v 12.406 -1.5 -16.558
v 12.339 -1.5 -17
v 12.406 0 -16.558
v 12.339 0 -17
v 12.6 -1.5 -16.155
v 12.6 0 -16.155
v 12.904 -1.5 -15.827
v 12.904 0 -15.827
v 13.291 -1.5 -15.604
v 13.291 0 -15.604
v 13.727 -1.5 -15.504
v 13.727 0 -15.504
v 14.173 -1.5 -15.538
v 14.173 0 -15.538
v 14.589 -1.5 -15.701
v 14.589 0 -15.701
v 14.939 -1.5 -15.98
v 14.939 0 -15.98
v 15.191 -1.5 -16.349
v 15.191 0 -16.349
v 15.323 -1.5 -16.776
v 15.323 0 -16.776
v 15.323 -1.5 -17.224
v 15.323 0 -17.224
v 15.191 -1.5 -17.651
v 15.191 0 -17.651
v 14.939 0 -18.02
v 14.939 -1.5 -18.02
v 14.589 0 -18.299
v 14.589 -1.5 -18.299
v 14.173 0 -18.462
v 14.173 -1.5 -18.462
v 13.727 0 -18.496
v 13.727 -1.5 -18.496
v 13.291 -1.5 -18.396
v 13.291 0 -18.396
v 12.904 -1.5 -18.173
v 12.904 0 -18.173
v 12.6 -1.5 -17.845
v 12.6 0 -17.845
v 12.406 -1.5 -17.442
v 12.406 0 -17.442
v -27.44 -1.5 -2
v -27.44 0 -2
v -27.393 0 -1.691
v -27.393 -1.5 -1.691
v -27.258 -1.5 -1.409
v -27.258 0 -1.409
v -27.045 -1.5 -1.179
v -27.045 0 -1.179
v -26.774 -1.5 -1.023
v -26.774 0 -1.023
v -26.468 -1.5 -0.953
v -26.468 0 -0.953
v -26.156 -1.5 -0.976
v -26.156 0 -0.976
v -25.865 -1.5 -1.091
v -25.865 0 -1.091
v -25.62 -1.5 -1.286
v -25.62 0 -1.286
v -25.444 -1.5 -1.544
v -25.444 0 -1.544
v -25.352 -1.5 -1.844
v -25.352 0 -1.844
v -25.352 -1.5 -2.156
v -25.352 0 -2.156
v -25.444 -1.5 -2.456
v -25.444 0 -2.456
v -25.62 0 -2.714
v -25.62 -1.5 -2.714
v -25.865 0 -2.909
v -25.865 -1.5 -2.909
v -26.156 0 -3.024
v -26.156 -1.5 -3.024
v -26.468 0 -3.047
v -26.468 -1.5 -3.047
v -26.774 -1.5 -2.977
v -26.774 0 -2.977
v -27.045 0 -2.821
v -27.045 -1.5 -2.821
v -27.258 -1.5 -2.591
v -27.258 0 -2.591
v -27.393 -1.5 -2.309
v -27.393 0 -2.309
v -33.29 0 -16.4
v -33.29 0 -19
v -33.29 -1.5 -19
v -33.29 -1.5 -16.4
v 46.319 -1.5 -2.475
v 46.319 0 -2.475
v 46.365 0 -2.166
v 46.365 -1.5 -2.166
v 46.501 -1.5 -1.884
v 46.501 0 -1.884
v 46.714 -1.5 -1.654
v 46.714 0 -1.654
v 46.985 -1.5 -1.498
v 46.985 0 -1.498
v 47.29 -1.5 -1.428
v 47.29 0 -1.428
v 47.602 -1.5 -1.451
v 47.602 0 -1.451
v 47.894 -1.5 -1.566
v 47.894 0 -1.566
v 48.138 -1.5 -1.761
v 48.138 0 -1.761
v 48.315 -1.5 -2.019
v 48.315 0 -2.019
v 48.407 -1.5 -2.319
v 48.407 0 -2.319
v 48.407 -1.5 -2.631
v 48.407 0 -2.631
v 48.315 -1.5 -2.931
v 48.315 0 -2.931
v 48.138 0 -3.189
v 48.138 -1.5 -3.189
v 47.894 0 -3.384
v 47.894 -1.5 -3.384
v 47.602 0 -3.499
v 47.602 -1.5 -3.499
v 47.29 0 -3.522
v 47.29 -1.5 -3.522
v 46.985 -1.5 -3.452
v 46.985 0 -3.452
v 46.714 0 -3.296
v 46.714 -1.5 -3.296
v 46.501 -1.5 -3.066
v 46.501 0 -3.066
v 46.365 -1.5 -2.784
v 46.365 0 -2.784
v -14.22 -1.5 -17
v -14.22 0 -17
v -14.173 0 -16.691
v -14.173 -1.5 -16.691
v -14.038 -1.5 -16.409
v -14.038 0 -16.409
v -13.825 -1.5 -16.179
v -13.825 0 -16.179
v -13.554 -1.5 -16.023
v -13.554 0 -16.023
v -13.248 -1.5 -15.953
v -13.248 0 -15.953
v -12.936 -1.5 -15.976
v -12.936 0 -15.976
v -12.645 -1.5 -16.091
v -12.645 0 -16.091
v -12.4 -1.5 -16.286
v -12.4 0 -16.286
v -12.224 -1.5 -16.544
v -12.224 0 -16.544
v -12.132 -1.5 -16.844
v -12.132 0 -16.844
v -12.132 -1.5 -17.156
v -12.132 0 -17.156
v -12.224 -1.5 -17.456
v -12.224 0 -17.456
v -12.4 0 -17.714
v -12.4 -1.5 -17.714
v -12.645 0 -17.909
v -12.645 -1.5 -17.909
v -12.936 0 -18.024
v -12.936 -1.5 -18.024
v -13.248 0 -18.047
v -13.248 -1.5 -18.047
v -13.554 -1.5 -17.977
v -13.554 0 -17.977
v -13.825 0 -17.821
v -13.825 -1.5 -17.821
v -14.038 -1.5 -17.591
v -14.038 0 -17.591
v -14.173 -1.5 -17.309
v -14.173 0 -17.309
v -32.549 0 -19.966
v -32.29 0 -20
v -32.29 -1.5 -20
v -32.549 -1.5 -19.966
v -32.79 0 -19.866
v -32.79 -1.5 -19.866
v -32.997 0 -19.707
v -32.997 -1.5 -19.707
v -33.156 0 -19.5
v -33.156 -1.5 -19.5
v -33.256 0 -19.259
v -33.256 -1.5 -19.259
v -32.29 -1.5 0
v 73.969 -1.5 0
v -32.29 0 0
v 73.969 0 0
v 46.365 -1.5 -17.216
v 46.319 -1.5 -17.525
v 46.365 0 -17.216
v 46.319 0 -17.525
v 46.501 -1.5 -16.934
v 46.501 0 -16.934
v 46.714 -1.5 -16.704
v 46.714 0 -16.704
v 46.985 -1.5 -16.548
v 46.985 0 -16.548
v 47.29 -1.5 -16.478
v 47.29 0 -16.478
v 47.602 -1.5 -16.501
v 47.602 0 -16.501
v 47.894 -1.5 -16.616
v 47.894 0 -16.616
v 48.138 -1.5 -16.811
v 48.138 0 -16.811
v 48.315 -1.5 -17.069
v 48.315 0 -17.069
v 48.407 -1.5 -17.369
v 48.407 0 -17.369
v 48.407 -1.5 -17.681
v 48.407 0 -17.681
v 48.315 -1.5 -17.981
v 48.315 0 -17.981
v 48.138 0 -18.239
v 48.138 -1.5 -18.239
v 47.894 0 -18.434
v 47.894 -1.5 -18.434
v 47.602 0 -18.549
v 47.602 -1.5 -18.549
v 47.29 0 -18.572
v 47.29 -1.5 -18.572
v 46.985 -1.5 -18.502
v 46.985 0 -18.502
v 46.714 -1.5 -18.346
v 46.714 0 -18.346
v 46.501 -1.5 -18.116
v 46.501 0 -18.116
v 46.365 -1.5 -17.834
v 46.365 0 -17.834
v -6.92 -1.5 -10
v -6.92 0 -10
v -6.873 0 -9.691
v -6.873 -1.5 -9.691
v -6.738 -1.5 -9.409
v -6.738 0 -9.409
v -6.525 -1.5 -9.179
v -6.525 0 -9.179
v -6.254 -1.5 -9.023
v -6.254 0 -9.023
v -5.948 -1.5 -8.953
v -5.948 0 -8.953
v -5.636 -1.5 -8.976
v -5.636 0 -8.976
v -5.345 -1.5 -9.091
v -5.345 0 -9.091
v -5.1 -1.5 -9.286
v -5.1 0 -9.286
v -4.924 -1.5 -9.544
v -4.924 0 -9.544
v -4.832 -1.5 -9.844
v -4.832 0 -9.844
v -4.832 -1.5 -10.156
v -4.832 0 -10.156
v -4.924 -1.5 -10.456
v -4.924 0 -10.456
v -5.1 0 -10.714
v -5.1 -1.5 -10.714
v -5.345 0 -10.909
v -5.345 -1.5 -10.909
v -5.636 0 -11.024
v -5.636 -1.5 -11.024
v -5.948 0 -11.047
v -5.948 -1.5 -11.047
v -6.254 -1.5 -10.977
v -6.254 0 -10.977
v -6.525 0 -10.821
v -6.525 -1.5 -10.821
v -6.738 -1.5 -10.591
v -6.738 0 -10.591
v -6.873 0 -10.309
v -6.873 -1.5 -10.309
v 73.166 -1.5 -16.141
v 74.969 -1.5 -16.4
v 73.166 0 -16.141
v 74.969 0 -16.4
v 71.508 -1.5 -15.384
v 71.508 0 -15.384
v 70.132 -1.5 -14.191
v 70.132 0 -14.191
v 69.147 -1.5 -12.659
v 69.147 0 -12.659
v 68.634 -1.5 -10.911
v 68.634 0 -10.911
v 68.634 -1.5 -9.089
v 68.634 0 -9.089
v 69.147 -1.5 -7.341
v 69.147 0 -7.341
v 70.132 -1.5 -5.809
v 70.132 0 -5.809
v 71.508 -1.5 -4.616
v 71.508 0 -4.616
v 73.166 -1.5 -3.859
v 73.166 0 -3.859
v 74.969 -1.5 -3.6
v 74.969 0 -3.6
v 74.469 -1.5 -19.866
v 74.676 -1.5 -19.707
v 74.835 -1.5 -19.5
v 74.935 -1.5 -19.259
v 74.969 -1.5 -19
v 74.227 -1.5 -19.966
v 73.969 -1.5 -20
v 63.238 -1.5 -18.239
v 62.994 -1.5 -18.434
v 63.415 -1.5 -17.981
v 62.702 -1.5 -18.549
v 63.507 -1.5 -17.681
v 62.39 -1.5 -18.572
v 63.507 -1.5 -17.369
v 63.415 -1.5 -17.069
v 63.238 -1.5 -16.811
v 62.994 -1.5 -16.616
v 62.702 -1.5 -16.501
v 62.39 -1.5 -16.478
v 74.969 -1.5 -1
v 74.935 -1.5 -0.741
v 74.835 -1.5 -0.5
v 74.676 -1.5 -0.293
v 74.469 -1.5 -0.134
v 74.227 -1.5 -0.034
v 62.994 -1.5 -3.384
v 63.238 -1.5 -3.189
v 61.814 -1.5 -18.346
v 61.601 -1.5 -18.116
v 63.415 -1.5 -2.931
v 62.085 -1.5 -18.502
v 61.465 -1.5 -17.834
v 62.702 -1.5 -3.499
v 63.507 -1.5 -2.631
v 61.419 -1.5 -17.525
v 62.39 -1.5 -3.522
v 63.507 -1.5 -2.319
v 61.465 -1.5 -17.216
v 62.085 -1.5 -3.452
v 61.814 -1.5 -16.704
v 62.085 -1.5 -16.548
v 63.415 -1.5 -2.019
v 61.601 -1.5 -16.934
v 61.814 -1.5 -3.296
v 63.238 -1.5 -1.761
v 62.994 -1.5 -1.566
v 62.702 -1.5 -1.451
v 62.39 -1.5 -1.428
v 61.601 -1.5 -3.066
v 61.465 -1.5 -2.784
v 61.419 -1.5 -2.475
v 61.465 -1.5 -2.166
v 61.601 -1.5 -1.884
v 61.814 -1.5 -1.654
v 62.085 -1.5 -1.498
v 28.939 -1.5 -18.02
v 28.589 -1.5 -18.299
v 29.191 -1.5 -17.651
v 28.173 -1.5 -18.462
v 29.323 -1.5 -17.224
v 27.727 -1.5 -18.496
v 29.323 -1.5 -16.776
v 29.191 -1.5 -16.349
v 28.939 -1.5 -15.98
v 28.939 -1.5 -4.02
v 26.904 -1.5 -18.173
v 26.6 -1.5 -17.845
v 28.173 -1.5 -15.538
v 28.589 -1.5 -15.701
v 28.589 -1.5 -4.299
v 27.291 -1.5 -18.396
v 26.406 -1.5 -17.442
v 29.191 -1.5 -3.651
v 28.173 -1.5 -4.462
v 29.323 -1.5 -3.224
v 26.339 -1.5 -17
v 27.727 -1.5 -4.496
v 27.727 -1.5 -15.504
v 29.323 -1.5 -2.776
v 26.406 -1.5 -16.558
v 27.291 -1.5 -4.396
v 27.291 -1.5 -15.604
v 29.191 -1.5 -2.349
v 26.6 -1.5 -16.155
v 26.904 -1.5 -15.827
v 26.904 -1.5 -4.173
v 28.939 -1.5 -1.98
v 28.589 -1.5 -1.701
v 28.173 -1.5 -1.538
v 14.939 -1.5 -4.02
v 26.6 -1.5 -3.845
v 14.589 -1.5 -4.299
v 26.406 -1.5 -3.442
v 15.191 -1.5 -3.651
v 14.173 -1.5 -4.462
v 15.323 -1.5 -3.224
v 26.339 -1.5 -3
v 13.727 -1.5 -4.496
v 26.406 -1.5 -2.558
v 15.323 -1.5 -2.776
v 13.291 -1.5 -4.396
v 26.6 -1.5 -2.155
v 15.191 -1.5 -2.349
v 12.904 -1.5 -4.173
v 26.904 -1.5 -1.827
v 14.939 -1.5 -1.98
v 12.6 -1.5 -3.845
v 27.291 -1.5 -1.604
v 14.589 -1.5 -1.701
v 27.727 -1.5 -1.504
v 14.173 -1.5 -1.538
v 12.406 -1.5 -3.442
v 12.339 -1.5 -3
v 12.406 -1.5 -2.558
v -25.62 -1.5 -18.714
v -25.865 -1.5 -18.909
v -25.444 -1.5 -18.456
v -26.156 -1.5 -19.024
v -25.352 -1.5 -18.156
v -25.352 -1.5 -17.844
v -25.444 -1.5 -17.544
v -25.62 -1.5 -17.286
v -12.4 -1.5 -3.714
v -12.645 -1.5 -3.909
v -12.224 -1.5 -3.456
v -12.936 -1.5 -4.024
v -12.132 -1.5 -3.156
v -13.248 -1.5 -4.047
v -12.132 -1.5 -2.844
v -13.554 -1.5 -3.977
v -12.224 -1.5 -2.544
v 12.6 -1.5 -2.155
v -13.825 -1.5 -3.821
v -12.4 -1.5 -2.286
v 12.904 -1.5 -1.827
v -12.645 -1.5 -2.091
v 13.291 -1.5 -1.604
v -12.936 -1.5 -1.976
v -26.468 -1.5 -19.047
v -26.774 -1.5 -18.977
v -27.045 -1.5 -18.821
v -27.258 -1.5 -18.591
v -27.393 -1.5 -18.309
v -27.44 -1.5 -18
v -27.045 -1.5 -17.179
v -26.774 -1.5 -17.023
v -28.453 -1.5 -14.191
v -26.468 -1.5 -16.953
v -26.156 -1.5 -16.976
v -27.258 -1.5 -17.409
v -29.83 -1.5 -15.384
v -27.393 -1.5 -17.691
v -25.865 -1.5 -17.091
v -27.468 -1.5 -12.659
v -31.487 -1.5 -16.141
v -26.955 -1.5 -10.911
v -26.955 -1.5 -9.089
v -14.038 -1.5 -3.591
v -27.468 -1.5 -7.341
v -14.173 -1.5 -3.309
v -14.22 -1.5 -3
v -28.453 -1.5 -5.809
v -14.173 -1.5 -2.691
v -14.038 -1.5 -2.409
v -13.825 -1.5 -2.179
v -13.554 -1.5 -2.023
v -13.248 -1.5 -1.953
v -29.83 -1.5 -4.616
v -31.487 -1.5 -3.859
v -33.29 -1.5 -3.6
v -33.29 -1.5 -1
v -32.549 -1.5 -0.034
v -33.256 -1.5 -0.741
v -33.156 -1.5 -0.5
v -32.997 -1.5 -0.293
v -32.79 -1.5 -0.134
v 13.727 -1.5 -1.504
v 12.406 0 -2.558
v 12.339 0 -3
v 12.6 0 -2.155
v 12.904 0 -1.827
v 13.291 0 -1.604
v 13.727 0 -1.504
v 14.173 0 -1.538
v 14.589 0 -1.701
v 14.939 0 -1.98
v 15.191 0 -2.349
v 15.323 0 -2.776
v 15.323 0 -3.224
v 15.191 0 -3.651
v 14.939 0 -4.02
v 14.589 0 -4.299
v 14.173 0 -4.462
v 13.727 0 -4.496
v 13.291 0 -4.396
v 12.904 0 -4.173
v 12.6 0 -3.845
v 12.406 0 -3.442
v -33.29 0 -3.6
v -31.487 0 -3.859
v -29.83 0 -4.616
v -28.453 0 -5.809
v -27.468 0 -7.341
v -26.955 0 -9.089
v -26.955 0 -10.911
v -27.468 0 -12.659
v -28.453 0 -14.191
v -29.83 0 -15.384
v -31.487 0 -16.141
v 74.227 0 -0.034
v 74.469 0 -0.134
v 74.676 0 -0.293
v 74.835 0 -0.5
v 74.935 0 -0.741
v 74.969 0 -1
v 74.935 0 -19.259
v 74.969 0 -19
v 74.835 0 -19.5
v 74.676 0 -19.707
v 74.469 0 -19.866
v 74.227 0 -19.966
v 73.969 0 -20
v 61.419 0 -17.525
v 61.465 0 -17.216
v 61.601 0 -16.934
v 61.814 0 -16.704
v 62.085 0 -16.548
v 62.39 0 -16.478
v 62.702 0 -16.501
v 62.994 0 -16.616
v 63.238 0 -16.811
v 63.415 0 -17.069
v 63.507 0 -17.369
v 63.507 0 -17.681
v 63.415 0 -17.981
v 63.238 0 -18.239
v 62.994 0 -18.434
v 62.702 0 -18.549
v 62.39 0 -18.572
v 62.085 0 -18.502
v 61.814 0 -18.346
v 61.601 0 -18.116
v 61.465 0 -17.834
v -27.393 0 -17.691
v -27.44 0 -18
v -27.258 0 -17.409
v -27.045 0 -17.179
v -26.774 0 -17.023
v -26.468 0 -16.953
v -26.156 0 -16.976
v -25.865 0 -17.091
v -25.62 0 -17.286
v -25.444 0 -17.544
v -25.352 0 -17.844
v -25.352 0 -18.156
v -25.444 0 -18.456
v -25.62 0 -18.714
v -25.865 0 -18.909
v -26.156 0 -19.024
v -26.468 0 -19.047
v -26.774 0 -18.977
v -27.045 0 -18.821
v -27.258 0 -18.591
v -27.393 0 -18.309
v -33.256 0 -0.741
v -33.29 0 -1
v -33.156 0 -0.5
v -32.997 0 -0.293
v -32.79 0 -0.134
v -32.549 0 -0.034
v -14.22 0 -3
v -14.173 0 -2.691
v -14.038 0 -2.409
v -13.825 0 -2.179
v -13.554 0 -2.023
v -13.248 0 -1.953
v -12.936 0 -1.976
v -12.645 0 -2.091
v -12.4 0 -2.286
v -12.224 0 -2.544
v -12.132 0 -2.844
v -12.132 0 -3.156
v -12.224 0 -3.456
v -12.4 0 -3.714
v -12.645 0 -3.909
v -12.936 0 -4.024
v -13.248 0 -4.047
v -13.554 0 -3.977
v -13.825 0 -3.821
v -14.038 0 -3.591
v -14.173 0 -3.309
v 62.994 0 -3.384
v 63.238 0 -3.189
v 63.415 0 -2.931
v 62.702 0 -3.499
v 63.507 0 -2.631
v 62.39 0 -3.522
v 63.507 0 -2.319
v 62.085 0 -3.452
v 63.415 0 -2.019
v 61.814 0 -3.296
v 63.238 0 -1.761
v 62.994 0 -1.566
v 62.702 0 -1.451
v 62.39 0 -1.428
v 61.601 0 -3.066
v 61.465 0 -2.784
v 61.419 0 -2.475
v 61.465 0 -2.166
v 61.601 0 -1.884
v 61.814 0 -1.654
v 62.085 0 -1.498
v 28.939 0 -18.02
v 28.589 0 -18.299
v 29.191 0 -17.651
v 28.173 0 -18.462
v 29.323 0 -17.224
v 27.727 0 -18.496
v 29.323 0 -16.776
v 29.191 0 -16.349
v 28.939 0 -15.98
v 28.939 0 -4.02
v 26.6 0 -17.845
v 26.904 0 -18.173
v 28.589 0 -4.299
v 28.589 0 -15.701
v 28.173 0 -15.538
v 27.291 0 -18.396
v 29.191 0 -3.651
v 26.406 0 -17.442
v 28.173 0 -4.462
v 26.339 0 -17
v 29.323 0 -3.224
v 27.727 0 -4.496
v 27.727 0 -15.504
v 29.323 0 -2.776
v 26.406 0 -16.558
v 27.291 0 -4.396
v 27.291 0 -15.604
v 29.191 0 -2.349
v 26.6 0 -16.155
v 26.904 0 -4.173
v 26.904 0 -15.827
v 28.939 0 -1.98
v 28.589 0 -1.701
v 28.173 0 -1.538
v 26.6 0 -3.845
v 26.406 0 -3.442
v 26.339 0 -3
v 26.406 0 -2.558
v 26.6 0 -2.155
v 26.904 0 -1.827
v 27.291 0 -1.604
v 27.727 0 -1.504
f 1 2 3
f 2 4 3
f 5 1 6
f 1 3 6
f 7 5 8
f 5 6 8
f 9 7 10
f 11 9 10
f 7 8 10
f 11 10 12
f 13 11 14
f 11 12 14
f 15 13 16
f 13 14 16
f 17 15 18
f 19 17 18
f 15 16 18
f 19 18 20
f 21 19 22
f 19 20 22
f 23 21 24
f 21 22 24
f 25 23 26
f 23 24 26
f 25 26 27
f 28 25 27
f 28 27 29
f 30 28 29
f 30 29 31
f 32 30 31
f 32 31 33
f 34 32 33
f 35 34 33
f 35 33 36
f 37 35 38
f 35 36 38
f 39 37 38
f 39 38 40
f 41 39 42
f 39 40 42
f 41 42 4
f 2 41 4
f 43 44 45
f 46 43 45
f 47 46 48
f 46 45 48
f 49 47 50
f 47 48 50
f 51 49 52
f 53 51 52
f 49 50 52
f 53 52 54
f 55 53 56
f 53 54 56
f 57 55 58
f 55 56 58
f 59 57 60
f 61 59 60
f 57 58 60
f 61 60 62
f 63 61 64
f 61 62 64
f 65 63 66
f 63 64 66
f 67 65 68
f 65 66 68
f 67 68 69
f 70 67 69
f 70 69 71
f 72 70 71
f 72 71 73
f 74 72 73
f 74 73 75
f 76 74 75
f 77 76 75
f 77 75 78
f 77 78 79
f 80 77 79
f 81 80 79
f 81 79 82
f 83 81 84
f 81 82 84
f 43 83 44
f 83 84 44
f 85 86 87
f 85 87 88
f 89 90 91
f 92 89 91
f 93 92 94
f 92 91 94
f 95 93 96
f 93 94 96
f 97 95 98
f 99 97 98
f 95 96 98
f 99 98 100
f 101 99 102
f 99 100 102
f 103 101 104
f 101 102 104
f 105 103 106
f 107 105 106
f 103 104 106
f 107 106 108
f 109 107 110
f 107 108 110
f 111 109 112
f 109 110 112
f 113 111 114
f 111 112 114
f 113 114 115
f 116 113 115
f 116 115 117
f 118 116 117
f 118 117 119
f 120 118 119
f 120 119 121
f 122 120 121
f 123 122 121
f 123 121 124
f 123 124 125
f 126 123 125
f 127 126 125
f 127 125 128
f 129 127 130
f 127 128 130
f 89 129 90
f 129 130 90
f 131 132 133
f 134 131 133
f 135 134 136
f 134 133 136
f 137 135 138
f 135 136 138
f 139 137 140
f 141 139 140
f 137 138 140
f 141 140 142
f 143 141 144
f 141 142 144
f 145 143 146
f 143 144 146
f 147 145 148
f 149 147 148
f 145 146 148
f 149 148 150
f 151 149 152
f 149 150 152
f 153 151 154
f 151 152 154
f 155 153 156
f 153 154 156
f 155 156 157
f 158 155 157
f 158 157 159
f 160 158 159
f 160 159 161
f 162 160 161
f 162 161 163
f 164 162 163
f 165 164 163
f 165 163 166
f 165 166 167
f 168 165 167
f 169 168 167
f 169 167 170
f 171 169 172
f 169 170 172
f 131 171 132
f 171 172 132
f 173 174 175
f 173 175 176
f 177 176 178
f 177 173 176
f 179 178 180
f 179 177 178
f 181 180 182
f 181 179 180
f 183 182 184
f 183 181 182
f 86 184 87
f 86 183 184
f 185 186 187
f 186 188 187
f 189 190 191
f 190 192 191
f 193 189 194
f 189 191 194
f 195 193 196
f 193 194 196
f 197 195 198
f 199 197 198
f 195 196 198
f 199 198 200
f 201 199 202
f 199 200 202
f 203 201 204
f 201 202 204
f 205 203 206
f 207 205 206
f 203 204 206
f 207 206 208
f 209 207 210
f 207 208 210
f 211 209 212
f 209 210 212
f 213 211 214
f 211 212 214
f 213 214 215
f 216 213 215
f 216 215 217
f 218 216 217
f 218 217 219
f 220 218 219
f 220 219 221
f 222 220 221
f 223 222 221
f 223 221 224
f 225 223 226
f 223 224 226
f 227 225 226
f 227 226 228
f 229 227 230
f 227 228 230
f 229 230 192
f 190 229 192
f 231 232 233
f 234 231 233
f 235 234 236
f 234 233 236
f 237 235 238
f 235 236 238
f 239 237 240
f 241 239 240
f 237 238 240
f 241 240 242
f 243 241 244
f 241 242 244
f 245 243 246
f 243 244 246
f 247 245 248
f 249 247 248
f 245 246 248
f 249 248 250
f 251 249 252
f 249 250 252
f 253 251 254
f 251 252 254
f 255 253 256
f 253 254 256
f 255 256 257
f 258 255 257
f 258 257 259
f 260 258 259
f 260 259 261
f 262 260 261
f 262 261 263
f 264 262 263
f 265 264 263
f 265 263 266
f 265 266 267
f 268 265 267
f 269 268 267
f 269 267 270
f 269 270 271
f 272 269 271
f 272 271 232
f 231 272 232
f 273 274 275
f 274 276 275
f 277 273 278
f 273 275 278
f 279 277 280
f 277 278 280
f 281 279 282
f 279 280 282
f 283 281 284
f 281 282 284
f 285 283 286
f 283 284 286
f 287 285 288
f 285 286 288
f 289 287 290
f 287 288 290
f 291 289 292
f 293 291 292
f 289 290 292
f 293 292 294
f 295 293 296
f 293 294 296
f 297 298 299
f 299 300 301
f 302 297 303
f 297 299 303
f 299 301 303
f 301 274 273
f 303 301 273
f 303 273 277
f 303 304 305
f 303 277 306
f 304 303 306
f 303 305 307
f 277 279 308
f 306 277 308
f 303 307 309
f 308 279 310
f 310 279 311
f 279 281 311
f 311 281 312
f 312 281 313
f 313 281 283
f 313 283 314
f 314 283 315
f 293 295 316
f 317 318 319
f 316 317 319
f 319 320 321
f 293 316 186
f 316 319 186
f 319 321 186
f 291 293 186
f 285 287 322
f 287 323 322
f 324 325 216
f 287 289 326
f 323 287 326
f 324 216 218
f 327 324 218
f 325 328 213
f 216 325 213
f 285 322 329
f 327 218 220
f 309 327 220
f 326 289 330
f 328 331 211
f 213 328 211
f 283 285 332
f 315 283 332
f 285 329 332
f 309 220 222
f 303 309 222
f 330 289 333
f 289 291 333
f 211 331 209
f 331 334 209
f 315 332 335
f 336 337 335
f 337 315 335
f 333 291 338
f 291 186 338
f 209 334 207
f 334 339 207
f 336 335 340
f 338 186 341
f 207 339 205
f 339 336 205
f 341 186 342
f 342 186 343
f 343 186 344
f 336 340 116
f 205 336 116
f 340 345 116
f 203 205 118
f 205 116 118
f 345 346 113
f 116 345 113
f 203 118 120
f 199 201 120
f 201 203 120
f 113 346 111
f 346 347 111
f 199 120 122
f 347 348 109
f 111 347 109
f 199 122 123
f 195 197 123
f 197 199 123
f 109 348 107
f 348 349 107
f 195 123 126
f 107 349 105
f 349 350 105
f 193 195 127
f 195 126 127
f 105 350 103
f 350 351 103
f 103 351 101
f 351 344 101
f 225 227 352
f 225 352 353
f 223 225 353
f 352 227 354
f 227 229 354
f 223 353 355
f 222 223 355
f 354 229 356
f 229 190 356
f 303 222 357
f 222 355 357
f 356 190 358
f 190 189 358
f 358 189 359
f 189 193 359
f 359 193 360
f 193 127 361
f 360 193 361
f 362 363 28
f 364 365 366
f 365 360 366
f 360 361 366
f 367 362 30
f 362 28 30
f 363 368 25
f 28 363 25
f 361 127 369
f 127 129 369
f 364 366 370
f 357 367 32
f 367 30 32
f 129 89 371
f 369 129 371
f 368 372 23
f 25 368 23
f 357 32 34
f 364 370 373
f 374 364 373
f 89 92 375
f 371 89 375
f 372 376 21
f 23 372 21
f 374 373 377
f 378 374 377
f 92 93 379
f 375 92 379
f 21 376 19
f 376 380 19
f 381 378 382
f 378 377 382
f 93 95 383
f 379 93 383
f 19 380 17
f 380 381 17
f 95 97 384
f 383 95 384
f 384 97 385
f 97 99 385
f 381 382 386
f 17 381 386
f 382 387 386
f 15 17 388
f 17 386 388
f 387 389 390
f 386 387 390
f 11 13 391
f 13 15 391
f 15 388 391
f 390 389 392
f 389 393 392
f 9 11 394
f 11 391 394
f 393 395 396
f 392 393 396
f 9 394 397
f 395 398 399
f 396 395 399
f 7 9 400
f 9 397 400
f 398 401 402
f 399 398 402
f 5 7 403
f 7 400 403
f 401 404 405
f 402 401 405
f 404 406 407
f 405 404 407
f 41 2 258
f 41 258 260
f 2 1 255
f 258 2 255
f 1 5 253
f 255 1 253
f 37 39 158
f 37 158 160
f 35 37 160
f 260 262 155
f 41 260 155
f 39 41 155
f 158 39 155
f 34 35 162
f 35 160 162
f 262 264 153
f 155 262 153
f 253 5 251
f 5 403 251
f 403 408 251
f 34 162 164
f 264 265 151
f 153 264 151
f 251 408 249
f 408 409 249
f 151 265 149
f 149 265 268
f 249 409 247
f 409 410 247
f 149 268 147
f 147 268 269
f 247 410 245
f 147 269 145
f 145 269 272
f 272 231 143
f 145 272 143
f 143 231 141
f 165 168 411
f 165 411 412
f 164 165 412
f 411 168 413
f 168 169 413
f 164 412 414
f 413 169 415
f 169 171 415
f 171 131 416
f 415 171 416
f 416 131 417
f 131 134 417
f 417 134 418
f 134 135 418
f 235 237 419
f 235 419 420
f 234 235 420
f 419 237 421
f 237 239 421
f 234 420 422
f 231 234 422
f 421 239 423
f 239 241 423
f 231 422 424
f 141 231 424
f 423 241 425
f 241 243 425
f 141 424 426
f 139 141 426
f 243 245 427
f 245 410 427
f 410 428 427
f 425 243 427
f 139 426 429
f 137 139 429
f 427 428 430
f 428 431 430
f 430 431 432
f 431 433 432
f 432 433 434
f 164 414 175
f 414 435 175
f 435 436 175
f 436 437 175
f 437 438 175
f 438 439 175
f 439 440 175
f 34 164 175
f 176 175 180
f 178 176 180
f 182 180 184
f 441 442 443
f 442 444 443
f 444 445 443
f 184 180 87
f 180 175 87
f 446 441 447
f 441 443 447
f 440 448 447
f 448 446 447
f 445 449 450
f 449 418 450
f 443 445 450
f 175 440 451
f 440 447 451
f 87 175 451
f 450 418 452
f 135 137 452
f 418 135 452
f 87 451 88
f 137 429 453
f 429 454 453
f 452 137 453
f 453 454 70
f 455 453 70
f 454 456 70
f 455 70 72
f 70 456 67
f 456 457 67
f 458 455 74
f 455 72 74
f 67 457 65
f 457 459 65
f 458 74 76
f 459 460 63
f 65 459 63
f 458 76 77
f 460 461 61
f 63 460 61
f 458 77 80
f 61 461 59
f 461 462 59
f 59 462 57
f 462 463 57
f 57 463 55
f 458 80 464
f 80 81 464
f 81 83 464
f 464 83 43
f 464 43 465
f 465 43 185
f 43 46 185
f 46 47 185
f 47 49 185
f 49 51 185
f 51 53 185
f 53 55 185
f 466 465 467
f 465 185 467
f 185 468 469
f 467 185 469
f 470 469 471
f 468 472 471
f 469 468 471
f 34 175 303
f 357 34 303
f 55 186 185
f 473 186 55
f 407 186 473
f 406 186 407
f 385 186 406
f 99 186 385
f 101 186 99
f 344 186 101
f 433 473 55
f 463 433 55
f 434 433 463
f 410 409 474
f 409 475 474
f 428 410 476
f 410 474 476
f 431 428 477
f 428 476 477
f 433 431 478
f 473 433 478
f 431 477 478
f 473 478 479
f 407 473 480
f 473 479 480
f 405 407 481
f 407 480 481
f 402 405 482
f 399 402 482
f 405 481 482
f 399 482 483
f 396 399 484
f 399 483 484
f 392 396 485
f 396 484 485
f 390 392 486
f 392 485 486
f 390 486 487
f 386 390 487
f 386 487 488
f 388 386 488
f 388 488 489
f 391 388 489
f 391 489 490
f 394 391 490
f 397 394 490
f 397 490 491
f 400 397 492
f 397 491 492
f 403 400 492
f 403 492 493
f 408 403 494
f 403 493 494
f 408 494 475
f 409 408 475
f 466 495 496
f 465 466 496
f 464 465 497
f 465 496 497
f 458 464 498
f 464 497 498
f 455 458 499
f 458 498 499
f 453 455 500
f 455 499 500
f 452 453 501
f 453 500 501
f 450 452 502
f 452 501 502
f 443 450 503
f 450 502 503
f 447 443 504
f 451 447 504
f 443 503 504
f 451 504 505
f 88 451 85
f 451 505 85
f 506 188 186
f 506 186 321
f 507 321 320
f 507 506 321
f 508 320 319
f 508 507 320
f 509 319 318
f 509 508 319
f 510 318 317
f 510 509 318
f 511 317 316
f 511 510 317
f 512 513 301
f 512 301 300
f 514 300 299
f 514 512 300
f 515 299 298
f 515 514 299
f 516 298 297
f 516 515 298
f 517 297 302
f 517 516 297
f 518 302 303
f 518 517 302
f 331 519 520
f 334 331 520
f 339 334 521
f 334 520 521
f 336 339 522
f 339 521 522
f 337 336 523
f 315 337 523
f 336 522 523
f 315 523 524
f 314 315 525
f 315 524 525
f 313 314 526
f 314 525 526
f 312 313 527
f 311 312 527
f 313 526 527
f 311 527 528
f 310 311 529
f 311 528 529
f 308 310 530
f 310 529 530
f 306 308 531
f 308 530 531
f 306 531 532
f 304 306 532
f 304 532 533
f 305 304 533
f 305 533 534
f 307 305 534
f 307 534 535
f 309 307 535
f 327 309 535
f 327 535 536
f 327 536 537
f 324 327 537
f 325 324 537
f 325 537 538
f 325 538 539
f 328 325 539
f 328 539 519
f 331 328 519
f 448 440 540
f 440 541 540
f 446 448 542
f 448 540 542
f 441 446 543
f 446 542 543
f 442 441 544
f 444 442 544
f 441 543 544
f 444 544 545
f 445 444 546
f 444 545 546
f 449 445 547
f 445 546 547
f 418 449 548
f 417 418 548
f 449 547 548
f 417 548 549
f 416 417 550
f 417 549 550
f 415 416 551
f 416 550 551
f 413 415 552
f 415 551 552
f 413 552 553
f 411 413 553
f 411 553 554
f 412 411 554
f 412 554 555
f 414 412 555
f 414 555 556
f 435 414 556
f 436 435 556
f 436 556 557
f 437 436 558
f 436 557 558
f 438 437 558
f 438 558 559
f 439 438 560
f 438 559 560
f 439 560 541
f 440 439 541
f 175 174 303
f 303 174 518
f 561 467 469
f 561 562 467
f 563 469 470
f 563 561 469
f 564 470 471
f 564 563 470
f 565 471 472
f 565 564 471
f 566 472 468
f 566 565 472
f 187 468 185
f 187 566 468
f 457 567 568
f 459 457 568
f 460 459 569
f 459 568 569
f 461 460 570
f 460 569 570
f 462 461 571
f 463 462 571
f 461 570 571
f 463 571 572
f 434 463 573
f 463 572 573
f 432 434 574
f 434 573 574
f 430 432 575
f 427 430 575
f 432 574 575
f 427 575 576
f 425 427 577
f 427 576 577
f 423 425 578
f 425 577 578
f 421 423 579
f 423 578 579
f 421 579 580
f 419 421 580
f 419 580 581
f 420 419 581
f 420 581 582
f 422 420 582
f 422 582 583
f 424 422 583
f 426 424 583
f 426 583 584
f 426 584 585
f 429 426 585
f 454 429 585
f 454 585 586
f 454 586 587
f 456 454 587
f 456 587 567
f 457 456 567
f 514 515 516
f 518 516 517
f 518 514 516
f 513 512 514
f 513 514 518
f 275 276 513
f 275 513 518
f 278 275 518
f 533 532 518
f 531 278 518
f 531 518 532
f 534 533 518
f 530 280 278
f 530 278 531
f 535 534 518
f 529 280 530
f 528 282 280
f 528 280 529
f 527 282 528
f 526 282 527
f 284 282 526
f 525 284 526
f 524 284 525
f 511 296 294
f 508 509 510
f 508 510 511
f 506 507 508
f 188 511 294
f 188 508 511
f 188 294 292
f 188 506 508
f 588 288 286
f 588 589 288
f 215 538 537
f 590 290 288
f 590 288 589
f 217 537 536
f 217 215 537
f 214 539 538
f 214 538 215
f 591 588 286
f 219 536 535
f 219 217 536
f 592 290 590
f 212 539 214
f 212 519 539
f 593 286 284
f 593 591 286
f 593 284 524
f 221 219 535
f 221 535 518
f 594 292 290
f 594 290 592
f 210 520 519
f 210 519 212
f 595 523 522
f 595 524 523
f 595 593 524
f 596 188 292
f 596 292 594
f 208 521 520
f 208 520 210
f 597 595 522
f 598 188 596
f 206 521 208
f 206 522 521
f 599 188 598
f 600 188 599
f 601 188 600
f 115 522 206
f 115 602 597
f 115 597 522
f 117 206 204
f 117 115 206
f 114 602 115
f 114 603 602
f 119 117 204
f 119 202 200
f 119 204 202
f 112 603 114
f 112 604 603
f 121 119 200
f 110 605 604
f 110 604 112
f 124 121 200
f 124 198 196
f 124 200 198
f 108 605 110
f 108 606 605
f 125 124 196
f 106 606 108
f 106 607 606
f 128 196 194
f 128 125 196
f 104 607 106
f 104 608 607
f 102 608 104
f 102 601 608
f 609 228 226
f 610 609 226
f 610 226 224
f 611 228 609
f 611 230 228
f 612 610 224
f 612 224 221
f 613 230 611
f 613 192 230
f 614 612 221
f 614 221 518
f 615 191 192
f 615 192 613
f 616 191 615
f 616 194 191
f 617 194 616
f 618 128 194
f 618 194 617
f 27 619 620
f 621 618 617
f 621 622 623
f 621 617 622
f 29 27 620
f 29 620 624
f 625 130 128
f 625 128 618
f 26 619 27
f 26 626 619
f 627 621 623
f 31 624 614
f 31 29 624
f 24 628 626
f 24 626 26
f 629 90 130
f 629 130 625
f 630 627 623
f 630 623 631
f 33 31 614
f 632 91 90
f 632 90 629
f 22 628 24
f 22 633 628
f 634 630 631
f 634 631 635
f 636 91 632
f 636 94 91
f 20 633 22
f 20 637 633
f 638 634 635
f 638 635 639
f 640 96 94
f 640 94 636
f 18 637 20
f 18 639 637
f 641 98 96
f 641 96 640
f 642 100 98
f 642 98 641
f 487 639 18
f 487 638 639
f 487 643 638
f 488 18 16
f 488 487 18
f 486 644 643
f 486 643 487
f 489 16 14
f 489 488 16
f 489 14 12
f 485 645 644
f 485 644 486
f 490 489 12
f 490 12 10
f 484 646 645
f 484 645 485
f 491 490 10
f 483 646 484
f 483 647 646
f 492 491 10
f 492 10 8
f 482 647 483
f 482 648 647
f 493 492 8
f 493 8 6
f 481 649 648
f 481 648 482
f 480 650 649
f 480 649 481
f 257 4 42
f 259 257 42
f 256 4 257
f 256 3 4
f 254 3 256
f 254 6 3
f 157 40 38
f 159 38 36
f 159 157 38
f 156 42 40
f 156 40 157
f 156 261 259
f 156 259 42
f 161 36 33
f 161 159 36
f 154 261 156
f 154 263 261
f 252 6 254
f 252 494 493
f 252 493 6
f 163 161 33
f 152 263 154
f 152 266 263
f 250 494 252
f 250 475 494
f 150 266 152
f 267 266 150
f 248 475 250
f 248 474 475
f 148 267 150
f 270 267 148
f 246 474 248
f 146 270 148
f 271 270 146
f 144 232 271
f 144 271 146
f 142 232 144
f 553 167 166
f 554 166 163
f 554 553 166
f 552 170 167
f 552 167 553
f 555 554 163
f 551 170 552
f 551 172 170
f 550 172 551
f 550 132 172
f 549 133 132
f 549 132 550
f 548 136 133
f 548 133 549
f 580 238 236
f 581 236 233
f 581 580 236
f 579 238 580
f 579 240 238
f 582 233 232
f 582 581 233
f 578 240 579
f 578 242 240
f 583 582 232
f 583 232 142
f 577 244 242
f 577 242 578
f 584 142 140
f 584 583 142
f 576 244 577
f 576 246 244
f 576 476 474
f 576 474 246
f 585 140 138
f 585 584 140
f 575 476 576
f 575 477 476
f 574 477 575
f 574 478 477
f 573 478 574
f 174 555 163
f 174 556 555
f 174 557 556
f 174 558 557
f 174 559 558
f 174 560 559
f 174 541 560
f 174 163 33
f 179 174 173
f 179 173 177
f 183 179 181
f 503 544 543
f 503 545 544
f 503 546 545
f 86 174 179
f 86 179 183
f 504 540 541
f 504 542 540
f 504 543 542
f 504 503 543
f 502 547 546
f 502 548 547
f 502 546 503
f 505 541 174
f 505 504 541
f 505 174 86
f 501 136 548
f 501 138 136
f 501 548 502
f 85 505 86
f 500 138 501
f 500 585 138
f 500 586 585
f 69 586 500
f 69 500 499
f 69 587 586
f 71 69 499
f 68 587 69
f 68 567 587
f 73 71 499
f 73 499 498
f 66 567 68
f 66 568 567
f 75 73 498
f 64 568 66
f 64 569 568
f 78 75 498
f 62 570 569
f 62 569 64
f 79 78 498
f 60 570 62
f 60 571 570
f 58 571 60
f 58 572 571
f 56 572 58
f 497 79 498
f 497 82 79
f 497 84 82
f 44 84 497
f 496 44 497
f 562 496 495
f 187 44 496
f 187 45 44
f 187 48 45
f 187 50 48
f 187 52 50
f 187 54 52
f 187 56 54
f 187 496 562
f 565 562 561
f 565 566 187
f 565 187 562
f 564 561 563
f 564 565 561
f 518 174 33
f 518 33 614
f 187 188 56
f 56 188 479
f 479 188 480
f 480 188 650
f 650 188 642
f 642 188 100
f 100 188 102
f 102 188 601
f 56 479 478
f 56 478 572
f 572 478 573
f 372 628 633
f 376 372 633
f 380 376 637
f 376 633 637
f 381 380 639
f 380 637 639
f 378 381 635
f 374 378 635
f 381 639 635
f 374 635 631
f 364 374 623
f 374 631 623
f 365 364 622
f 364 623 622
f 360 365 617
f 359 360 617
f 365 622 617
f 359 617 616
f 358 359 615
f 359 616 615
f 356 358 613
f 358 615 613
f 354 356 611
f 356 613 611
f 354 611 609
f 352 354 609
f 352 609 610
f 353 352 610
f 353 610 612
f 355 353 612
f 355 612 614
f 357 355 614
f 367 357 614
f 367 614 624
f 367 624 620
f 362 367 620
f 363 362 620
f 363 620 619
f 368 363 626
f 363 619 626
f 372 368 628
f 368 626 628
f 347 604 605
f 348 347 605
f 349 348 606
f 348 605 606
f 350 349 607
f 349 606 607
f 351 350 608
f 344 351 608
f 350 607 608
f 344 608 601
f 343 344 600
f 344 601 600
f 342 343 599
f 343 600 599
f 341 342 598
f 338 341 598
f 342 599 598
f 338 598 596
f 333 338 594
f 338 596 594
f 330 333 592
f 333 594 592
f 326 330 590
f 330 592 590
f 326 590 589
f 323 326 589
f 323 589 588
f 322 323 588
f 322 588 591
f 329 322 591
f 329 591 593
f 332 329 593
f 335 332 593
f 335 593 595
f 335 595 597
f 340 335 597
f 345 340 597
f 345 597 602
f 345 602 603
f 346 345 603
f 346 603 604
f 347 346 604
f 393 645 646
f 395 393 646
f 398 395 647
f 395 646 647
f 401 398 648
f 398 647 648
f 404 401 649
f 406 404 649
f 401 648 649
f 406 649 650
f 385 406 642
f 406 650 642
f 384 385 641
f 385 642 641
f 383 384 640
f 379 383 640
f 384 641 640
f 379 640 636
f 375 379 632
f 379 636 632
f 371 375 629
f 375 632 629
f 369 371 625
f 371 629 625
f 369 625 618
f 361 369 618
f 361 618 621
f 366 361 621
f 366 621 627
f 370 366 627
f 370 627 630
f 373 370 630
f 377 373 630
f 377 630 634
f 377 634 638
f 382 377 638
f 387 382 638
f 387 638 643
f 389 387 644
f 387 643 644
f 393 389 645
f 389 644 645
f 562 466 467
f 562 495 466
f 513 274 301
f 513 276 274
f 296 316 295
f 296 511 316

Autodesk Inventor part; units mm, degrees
ref_plane "YZ Plane" through (0, 0, 0) normal (1, 0, 0) x (0, 1, 0)
ref_plane "XZ Plane" through (0, 0, 0) normal (0, 1, 0) x (-1, 0, 0)
ref_plane "XY Plane" through (0, 0, 0) normal (0, 0, 1) x (1, 0, 0)
sketch "Sketch1" plane through (0, 0, 0) normal (0, 1, 0) x (-1, 0, 0)
  line L0 (-0.4496, -20) -> (-0.4496, 0)
  line L1 (-41.2289, 0) -> (-41.2289, -20)
  circle A0 centre (13.17, -3) radius 1.05
  circle A1 centre (5.87, -10) radius 1.05
  circle A2 centre (13.17, -17) radius 1.05
  circle A3 centre (26.39, -18) radius 1.05
  circle A4 centre (26.39, -2) radius 1.05
  circle A5 centre (-62.4686, -2.475) radius 1.05
  circle A6 centre (-62.4686, -17.525) radius 1.05
  circle A7 centre (-47.3686, -17.525) radius 1.05
  circle A8 centre (-47.3686, -2.475) radius 1.05
  circle A9 centre (-13.8393, -17) radius 1.5
  circle A10 centre (-13.8393, -3) radius 1.5
  circle A11 centre (-27.8393, -3) radius 1.5
  circle A12 centre (-27.8393, -17) radius 1.5
  arc A13 (32.29, -20) -> (33.29, -19) centre (32.29, -19) ccw
  line L2 (33.29, -19) -> (33.29, -16.4)
  arc A14 (33.29, -1) -> (32.29, 0) centre (32.29, -1) ccw
  line L3 (33.29, -3.6) -> (33.29, -1)
  arc A15 (-73.9686, 0) -> (-74.9686, -1) centre (-73.9686, -1) ccw
  arc A16 (-74.9686, -19) -> (-73.9686, -20) centre (-73.9686, -19) ccw
  line L4 (-74.9686, -1) -> (-74.9686, -3.6)
  line L5 (-74.9686, -16.4) -> (-74.9686, -19)
  arc A17 (33.29, -3.6) -> (33.29, -16.4) centre (33.29, -10) ccw
  arc A18 (-74.9686, -16.4) -> (-74.9686, -3.6) centre (-74.9686, -10) ccw
  line L6 (32.29, -20) -> (-73.9686, -20)
  line L7 (-73.9686, 0) -> (32.29, 0)
  line L8 (-41.6786, -20) -> (-41.6786, 0)
  line L9 (-40.7793, 0) -> (-40.7793, -20)
  line L10 (-0.8993, -20) -> (-0.8993, 0)
  line L11 (0, 0) -> (0, -20)
extrude "Extrusion1" add sketch "Sketch1" against normal blind 1.5
properties part number "CAM_axis_5_top_frame"
